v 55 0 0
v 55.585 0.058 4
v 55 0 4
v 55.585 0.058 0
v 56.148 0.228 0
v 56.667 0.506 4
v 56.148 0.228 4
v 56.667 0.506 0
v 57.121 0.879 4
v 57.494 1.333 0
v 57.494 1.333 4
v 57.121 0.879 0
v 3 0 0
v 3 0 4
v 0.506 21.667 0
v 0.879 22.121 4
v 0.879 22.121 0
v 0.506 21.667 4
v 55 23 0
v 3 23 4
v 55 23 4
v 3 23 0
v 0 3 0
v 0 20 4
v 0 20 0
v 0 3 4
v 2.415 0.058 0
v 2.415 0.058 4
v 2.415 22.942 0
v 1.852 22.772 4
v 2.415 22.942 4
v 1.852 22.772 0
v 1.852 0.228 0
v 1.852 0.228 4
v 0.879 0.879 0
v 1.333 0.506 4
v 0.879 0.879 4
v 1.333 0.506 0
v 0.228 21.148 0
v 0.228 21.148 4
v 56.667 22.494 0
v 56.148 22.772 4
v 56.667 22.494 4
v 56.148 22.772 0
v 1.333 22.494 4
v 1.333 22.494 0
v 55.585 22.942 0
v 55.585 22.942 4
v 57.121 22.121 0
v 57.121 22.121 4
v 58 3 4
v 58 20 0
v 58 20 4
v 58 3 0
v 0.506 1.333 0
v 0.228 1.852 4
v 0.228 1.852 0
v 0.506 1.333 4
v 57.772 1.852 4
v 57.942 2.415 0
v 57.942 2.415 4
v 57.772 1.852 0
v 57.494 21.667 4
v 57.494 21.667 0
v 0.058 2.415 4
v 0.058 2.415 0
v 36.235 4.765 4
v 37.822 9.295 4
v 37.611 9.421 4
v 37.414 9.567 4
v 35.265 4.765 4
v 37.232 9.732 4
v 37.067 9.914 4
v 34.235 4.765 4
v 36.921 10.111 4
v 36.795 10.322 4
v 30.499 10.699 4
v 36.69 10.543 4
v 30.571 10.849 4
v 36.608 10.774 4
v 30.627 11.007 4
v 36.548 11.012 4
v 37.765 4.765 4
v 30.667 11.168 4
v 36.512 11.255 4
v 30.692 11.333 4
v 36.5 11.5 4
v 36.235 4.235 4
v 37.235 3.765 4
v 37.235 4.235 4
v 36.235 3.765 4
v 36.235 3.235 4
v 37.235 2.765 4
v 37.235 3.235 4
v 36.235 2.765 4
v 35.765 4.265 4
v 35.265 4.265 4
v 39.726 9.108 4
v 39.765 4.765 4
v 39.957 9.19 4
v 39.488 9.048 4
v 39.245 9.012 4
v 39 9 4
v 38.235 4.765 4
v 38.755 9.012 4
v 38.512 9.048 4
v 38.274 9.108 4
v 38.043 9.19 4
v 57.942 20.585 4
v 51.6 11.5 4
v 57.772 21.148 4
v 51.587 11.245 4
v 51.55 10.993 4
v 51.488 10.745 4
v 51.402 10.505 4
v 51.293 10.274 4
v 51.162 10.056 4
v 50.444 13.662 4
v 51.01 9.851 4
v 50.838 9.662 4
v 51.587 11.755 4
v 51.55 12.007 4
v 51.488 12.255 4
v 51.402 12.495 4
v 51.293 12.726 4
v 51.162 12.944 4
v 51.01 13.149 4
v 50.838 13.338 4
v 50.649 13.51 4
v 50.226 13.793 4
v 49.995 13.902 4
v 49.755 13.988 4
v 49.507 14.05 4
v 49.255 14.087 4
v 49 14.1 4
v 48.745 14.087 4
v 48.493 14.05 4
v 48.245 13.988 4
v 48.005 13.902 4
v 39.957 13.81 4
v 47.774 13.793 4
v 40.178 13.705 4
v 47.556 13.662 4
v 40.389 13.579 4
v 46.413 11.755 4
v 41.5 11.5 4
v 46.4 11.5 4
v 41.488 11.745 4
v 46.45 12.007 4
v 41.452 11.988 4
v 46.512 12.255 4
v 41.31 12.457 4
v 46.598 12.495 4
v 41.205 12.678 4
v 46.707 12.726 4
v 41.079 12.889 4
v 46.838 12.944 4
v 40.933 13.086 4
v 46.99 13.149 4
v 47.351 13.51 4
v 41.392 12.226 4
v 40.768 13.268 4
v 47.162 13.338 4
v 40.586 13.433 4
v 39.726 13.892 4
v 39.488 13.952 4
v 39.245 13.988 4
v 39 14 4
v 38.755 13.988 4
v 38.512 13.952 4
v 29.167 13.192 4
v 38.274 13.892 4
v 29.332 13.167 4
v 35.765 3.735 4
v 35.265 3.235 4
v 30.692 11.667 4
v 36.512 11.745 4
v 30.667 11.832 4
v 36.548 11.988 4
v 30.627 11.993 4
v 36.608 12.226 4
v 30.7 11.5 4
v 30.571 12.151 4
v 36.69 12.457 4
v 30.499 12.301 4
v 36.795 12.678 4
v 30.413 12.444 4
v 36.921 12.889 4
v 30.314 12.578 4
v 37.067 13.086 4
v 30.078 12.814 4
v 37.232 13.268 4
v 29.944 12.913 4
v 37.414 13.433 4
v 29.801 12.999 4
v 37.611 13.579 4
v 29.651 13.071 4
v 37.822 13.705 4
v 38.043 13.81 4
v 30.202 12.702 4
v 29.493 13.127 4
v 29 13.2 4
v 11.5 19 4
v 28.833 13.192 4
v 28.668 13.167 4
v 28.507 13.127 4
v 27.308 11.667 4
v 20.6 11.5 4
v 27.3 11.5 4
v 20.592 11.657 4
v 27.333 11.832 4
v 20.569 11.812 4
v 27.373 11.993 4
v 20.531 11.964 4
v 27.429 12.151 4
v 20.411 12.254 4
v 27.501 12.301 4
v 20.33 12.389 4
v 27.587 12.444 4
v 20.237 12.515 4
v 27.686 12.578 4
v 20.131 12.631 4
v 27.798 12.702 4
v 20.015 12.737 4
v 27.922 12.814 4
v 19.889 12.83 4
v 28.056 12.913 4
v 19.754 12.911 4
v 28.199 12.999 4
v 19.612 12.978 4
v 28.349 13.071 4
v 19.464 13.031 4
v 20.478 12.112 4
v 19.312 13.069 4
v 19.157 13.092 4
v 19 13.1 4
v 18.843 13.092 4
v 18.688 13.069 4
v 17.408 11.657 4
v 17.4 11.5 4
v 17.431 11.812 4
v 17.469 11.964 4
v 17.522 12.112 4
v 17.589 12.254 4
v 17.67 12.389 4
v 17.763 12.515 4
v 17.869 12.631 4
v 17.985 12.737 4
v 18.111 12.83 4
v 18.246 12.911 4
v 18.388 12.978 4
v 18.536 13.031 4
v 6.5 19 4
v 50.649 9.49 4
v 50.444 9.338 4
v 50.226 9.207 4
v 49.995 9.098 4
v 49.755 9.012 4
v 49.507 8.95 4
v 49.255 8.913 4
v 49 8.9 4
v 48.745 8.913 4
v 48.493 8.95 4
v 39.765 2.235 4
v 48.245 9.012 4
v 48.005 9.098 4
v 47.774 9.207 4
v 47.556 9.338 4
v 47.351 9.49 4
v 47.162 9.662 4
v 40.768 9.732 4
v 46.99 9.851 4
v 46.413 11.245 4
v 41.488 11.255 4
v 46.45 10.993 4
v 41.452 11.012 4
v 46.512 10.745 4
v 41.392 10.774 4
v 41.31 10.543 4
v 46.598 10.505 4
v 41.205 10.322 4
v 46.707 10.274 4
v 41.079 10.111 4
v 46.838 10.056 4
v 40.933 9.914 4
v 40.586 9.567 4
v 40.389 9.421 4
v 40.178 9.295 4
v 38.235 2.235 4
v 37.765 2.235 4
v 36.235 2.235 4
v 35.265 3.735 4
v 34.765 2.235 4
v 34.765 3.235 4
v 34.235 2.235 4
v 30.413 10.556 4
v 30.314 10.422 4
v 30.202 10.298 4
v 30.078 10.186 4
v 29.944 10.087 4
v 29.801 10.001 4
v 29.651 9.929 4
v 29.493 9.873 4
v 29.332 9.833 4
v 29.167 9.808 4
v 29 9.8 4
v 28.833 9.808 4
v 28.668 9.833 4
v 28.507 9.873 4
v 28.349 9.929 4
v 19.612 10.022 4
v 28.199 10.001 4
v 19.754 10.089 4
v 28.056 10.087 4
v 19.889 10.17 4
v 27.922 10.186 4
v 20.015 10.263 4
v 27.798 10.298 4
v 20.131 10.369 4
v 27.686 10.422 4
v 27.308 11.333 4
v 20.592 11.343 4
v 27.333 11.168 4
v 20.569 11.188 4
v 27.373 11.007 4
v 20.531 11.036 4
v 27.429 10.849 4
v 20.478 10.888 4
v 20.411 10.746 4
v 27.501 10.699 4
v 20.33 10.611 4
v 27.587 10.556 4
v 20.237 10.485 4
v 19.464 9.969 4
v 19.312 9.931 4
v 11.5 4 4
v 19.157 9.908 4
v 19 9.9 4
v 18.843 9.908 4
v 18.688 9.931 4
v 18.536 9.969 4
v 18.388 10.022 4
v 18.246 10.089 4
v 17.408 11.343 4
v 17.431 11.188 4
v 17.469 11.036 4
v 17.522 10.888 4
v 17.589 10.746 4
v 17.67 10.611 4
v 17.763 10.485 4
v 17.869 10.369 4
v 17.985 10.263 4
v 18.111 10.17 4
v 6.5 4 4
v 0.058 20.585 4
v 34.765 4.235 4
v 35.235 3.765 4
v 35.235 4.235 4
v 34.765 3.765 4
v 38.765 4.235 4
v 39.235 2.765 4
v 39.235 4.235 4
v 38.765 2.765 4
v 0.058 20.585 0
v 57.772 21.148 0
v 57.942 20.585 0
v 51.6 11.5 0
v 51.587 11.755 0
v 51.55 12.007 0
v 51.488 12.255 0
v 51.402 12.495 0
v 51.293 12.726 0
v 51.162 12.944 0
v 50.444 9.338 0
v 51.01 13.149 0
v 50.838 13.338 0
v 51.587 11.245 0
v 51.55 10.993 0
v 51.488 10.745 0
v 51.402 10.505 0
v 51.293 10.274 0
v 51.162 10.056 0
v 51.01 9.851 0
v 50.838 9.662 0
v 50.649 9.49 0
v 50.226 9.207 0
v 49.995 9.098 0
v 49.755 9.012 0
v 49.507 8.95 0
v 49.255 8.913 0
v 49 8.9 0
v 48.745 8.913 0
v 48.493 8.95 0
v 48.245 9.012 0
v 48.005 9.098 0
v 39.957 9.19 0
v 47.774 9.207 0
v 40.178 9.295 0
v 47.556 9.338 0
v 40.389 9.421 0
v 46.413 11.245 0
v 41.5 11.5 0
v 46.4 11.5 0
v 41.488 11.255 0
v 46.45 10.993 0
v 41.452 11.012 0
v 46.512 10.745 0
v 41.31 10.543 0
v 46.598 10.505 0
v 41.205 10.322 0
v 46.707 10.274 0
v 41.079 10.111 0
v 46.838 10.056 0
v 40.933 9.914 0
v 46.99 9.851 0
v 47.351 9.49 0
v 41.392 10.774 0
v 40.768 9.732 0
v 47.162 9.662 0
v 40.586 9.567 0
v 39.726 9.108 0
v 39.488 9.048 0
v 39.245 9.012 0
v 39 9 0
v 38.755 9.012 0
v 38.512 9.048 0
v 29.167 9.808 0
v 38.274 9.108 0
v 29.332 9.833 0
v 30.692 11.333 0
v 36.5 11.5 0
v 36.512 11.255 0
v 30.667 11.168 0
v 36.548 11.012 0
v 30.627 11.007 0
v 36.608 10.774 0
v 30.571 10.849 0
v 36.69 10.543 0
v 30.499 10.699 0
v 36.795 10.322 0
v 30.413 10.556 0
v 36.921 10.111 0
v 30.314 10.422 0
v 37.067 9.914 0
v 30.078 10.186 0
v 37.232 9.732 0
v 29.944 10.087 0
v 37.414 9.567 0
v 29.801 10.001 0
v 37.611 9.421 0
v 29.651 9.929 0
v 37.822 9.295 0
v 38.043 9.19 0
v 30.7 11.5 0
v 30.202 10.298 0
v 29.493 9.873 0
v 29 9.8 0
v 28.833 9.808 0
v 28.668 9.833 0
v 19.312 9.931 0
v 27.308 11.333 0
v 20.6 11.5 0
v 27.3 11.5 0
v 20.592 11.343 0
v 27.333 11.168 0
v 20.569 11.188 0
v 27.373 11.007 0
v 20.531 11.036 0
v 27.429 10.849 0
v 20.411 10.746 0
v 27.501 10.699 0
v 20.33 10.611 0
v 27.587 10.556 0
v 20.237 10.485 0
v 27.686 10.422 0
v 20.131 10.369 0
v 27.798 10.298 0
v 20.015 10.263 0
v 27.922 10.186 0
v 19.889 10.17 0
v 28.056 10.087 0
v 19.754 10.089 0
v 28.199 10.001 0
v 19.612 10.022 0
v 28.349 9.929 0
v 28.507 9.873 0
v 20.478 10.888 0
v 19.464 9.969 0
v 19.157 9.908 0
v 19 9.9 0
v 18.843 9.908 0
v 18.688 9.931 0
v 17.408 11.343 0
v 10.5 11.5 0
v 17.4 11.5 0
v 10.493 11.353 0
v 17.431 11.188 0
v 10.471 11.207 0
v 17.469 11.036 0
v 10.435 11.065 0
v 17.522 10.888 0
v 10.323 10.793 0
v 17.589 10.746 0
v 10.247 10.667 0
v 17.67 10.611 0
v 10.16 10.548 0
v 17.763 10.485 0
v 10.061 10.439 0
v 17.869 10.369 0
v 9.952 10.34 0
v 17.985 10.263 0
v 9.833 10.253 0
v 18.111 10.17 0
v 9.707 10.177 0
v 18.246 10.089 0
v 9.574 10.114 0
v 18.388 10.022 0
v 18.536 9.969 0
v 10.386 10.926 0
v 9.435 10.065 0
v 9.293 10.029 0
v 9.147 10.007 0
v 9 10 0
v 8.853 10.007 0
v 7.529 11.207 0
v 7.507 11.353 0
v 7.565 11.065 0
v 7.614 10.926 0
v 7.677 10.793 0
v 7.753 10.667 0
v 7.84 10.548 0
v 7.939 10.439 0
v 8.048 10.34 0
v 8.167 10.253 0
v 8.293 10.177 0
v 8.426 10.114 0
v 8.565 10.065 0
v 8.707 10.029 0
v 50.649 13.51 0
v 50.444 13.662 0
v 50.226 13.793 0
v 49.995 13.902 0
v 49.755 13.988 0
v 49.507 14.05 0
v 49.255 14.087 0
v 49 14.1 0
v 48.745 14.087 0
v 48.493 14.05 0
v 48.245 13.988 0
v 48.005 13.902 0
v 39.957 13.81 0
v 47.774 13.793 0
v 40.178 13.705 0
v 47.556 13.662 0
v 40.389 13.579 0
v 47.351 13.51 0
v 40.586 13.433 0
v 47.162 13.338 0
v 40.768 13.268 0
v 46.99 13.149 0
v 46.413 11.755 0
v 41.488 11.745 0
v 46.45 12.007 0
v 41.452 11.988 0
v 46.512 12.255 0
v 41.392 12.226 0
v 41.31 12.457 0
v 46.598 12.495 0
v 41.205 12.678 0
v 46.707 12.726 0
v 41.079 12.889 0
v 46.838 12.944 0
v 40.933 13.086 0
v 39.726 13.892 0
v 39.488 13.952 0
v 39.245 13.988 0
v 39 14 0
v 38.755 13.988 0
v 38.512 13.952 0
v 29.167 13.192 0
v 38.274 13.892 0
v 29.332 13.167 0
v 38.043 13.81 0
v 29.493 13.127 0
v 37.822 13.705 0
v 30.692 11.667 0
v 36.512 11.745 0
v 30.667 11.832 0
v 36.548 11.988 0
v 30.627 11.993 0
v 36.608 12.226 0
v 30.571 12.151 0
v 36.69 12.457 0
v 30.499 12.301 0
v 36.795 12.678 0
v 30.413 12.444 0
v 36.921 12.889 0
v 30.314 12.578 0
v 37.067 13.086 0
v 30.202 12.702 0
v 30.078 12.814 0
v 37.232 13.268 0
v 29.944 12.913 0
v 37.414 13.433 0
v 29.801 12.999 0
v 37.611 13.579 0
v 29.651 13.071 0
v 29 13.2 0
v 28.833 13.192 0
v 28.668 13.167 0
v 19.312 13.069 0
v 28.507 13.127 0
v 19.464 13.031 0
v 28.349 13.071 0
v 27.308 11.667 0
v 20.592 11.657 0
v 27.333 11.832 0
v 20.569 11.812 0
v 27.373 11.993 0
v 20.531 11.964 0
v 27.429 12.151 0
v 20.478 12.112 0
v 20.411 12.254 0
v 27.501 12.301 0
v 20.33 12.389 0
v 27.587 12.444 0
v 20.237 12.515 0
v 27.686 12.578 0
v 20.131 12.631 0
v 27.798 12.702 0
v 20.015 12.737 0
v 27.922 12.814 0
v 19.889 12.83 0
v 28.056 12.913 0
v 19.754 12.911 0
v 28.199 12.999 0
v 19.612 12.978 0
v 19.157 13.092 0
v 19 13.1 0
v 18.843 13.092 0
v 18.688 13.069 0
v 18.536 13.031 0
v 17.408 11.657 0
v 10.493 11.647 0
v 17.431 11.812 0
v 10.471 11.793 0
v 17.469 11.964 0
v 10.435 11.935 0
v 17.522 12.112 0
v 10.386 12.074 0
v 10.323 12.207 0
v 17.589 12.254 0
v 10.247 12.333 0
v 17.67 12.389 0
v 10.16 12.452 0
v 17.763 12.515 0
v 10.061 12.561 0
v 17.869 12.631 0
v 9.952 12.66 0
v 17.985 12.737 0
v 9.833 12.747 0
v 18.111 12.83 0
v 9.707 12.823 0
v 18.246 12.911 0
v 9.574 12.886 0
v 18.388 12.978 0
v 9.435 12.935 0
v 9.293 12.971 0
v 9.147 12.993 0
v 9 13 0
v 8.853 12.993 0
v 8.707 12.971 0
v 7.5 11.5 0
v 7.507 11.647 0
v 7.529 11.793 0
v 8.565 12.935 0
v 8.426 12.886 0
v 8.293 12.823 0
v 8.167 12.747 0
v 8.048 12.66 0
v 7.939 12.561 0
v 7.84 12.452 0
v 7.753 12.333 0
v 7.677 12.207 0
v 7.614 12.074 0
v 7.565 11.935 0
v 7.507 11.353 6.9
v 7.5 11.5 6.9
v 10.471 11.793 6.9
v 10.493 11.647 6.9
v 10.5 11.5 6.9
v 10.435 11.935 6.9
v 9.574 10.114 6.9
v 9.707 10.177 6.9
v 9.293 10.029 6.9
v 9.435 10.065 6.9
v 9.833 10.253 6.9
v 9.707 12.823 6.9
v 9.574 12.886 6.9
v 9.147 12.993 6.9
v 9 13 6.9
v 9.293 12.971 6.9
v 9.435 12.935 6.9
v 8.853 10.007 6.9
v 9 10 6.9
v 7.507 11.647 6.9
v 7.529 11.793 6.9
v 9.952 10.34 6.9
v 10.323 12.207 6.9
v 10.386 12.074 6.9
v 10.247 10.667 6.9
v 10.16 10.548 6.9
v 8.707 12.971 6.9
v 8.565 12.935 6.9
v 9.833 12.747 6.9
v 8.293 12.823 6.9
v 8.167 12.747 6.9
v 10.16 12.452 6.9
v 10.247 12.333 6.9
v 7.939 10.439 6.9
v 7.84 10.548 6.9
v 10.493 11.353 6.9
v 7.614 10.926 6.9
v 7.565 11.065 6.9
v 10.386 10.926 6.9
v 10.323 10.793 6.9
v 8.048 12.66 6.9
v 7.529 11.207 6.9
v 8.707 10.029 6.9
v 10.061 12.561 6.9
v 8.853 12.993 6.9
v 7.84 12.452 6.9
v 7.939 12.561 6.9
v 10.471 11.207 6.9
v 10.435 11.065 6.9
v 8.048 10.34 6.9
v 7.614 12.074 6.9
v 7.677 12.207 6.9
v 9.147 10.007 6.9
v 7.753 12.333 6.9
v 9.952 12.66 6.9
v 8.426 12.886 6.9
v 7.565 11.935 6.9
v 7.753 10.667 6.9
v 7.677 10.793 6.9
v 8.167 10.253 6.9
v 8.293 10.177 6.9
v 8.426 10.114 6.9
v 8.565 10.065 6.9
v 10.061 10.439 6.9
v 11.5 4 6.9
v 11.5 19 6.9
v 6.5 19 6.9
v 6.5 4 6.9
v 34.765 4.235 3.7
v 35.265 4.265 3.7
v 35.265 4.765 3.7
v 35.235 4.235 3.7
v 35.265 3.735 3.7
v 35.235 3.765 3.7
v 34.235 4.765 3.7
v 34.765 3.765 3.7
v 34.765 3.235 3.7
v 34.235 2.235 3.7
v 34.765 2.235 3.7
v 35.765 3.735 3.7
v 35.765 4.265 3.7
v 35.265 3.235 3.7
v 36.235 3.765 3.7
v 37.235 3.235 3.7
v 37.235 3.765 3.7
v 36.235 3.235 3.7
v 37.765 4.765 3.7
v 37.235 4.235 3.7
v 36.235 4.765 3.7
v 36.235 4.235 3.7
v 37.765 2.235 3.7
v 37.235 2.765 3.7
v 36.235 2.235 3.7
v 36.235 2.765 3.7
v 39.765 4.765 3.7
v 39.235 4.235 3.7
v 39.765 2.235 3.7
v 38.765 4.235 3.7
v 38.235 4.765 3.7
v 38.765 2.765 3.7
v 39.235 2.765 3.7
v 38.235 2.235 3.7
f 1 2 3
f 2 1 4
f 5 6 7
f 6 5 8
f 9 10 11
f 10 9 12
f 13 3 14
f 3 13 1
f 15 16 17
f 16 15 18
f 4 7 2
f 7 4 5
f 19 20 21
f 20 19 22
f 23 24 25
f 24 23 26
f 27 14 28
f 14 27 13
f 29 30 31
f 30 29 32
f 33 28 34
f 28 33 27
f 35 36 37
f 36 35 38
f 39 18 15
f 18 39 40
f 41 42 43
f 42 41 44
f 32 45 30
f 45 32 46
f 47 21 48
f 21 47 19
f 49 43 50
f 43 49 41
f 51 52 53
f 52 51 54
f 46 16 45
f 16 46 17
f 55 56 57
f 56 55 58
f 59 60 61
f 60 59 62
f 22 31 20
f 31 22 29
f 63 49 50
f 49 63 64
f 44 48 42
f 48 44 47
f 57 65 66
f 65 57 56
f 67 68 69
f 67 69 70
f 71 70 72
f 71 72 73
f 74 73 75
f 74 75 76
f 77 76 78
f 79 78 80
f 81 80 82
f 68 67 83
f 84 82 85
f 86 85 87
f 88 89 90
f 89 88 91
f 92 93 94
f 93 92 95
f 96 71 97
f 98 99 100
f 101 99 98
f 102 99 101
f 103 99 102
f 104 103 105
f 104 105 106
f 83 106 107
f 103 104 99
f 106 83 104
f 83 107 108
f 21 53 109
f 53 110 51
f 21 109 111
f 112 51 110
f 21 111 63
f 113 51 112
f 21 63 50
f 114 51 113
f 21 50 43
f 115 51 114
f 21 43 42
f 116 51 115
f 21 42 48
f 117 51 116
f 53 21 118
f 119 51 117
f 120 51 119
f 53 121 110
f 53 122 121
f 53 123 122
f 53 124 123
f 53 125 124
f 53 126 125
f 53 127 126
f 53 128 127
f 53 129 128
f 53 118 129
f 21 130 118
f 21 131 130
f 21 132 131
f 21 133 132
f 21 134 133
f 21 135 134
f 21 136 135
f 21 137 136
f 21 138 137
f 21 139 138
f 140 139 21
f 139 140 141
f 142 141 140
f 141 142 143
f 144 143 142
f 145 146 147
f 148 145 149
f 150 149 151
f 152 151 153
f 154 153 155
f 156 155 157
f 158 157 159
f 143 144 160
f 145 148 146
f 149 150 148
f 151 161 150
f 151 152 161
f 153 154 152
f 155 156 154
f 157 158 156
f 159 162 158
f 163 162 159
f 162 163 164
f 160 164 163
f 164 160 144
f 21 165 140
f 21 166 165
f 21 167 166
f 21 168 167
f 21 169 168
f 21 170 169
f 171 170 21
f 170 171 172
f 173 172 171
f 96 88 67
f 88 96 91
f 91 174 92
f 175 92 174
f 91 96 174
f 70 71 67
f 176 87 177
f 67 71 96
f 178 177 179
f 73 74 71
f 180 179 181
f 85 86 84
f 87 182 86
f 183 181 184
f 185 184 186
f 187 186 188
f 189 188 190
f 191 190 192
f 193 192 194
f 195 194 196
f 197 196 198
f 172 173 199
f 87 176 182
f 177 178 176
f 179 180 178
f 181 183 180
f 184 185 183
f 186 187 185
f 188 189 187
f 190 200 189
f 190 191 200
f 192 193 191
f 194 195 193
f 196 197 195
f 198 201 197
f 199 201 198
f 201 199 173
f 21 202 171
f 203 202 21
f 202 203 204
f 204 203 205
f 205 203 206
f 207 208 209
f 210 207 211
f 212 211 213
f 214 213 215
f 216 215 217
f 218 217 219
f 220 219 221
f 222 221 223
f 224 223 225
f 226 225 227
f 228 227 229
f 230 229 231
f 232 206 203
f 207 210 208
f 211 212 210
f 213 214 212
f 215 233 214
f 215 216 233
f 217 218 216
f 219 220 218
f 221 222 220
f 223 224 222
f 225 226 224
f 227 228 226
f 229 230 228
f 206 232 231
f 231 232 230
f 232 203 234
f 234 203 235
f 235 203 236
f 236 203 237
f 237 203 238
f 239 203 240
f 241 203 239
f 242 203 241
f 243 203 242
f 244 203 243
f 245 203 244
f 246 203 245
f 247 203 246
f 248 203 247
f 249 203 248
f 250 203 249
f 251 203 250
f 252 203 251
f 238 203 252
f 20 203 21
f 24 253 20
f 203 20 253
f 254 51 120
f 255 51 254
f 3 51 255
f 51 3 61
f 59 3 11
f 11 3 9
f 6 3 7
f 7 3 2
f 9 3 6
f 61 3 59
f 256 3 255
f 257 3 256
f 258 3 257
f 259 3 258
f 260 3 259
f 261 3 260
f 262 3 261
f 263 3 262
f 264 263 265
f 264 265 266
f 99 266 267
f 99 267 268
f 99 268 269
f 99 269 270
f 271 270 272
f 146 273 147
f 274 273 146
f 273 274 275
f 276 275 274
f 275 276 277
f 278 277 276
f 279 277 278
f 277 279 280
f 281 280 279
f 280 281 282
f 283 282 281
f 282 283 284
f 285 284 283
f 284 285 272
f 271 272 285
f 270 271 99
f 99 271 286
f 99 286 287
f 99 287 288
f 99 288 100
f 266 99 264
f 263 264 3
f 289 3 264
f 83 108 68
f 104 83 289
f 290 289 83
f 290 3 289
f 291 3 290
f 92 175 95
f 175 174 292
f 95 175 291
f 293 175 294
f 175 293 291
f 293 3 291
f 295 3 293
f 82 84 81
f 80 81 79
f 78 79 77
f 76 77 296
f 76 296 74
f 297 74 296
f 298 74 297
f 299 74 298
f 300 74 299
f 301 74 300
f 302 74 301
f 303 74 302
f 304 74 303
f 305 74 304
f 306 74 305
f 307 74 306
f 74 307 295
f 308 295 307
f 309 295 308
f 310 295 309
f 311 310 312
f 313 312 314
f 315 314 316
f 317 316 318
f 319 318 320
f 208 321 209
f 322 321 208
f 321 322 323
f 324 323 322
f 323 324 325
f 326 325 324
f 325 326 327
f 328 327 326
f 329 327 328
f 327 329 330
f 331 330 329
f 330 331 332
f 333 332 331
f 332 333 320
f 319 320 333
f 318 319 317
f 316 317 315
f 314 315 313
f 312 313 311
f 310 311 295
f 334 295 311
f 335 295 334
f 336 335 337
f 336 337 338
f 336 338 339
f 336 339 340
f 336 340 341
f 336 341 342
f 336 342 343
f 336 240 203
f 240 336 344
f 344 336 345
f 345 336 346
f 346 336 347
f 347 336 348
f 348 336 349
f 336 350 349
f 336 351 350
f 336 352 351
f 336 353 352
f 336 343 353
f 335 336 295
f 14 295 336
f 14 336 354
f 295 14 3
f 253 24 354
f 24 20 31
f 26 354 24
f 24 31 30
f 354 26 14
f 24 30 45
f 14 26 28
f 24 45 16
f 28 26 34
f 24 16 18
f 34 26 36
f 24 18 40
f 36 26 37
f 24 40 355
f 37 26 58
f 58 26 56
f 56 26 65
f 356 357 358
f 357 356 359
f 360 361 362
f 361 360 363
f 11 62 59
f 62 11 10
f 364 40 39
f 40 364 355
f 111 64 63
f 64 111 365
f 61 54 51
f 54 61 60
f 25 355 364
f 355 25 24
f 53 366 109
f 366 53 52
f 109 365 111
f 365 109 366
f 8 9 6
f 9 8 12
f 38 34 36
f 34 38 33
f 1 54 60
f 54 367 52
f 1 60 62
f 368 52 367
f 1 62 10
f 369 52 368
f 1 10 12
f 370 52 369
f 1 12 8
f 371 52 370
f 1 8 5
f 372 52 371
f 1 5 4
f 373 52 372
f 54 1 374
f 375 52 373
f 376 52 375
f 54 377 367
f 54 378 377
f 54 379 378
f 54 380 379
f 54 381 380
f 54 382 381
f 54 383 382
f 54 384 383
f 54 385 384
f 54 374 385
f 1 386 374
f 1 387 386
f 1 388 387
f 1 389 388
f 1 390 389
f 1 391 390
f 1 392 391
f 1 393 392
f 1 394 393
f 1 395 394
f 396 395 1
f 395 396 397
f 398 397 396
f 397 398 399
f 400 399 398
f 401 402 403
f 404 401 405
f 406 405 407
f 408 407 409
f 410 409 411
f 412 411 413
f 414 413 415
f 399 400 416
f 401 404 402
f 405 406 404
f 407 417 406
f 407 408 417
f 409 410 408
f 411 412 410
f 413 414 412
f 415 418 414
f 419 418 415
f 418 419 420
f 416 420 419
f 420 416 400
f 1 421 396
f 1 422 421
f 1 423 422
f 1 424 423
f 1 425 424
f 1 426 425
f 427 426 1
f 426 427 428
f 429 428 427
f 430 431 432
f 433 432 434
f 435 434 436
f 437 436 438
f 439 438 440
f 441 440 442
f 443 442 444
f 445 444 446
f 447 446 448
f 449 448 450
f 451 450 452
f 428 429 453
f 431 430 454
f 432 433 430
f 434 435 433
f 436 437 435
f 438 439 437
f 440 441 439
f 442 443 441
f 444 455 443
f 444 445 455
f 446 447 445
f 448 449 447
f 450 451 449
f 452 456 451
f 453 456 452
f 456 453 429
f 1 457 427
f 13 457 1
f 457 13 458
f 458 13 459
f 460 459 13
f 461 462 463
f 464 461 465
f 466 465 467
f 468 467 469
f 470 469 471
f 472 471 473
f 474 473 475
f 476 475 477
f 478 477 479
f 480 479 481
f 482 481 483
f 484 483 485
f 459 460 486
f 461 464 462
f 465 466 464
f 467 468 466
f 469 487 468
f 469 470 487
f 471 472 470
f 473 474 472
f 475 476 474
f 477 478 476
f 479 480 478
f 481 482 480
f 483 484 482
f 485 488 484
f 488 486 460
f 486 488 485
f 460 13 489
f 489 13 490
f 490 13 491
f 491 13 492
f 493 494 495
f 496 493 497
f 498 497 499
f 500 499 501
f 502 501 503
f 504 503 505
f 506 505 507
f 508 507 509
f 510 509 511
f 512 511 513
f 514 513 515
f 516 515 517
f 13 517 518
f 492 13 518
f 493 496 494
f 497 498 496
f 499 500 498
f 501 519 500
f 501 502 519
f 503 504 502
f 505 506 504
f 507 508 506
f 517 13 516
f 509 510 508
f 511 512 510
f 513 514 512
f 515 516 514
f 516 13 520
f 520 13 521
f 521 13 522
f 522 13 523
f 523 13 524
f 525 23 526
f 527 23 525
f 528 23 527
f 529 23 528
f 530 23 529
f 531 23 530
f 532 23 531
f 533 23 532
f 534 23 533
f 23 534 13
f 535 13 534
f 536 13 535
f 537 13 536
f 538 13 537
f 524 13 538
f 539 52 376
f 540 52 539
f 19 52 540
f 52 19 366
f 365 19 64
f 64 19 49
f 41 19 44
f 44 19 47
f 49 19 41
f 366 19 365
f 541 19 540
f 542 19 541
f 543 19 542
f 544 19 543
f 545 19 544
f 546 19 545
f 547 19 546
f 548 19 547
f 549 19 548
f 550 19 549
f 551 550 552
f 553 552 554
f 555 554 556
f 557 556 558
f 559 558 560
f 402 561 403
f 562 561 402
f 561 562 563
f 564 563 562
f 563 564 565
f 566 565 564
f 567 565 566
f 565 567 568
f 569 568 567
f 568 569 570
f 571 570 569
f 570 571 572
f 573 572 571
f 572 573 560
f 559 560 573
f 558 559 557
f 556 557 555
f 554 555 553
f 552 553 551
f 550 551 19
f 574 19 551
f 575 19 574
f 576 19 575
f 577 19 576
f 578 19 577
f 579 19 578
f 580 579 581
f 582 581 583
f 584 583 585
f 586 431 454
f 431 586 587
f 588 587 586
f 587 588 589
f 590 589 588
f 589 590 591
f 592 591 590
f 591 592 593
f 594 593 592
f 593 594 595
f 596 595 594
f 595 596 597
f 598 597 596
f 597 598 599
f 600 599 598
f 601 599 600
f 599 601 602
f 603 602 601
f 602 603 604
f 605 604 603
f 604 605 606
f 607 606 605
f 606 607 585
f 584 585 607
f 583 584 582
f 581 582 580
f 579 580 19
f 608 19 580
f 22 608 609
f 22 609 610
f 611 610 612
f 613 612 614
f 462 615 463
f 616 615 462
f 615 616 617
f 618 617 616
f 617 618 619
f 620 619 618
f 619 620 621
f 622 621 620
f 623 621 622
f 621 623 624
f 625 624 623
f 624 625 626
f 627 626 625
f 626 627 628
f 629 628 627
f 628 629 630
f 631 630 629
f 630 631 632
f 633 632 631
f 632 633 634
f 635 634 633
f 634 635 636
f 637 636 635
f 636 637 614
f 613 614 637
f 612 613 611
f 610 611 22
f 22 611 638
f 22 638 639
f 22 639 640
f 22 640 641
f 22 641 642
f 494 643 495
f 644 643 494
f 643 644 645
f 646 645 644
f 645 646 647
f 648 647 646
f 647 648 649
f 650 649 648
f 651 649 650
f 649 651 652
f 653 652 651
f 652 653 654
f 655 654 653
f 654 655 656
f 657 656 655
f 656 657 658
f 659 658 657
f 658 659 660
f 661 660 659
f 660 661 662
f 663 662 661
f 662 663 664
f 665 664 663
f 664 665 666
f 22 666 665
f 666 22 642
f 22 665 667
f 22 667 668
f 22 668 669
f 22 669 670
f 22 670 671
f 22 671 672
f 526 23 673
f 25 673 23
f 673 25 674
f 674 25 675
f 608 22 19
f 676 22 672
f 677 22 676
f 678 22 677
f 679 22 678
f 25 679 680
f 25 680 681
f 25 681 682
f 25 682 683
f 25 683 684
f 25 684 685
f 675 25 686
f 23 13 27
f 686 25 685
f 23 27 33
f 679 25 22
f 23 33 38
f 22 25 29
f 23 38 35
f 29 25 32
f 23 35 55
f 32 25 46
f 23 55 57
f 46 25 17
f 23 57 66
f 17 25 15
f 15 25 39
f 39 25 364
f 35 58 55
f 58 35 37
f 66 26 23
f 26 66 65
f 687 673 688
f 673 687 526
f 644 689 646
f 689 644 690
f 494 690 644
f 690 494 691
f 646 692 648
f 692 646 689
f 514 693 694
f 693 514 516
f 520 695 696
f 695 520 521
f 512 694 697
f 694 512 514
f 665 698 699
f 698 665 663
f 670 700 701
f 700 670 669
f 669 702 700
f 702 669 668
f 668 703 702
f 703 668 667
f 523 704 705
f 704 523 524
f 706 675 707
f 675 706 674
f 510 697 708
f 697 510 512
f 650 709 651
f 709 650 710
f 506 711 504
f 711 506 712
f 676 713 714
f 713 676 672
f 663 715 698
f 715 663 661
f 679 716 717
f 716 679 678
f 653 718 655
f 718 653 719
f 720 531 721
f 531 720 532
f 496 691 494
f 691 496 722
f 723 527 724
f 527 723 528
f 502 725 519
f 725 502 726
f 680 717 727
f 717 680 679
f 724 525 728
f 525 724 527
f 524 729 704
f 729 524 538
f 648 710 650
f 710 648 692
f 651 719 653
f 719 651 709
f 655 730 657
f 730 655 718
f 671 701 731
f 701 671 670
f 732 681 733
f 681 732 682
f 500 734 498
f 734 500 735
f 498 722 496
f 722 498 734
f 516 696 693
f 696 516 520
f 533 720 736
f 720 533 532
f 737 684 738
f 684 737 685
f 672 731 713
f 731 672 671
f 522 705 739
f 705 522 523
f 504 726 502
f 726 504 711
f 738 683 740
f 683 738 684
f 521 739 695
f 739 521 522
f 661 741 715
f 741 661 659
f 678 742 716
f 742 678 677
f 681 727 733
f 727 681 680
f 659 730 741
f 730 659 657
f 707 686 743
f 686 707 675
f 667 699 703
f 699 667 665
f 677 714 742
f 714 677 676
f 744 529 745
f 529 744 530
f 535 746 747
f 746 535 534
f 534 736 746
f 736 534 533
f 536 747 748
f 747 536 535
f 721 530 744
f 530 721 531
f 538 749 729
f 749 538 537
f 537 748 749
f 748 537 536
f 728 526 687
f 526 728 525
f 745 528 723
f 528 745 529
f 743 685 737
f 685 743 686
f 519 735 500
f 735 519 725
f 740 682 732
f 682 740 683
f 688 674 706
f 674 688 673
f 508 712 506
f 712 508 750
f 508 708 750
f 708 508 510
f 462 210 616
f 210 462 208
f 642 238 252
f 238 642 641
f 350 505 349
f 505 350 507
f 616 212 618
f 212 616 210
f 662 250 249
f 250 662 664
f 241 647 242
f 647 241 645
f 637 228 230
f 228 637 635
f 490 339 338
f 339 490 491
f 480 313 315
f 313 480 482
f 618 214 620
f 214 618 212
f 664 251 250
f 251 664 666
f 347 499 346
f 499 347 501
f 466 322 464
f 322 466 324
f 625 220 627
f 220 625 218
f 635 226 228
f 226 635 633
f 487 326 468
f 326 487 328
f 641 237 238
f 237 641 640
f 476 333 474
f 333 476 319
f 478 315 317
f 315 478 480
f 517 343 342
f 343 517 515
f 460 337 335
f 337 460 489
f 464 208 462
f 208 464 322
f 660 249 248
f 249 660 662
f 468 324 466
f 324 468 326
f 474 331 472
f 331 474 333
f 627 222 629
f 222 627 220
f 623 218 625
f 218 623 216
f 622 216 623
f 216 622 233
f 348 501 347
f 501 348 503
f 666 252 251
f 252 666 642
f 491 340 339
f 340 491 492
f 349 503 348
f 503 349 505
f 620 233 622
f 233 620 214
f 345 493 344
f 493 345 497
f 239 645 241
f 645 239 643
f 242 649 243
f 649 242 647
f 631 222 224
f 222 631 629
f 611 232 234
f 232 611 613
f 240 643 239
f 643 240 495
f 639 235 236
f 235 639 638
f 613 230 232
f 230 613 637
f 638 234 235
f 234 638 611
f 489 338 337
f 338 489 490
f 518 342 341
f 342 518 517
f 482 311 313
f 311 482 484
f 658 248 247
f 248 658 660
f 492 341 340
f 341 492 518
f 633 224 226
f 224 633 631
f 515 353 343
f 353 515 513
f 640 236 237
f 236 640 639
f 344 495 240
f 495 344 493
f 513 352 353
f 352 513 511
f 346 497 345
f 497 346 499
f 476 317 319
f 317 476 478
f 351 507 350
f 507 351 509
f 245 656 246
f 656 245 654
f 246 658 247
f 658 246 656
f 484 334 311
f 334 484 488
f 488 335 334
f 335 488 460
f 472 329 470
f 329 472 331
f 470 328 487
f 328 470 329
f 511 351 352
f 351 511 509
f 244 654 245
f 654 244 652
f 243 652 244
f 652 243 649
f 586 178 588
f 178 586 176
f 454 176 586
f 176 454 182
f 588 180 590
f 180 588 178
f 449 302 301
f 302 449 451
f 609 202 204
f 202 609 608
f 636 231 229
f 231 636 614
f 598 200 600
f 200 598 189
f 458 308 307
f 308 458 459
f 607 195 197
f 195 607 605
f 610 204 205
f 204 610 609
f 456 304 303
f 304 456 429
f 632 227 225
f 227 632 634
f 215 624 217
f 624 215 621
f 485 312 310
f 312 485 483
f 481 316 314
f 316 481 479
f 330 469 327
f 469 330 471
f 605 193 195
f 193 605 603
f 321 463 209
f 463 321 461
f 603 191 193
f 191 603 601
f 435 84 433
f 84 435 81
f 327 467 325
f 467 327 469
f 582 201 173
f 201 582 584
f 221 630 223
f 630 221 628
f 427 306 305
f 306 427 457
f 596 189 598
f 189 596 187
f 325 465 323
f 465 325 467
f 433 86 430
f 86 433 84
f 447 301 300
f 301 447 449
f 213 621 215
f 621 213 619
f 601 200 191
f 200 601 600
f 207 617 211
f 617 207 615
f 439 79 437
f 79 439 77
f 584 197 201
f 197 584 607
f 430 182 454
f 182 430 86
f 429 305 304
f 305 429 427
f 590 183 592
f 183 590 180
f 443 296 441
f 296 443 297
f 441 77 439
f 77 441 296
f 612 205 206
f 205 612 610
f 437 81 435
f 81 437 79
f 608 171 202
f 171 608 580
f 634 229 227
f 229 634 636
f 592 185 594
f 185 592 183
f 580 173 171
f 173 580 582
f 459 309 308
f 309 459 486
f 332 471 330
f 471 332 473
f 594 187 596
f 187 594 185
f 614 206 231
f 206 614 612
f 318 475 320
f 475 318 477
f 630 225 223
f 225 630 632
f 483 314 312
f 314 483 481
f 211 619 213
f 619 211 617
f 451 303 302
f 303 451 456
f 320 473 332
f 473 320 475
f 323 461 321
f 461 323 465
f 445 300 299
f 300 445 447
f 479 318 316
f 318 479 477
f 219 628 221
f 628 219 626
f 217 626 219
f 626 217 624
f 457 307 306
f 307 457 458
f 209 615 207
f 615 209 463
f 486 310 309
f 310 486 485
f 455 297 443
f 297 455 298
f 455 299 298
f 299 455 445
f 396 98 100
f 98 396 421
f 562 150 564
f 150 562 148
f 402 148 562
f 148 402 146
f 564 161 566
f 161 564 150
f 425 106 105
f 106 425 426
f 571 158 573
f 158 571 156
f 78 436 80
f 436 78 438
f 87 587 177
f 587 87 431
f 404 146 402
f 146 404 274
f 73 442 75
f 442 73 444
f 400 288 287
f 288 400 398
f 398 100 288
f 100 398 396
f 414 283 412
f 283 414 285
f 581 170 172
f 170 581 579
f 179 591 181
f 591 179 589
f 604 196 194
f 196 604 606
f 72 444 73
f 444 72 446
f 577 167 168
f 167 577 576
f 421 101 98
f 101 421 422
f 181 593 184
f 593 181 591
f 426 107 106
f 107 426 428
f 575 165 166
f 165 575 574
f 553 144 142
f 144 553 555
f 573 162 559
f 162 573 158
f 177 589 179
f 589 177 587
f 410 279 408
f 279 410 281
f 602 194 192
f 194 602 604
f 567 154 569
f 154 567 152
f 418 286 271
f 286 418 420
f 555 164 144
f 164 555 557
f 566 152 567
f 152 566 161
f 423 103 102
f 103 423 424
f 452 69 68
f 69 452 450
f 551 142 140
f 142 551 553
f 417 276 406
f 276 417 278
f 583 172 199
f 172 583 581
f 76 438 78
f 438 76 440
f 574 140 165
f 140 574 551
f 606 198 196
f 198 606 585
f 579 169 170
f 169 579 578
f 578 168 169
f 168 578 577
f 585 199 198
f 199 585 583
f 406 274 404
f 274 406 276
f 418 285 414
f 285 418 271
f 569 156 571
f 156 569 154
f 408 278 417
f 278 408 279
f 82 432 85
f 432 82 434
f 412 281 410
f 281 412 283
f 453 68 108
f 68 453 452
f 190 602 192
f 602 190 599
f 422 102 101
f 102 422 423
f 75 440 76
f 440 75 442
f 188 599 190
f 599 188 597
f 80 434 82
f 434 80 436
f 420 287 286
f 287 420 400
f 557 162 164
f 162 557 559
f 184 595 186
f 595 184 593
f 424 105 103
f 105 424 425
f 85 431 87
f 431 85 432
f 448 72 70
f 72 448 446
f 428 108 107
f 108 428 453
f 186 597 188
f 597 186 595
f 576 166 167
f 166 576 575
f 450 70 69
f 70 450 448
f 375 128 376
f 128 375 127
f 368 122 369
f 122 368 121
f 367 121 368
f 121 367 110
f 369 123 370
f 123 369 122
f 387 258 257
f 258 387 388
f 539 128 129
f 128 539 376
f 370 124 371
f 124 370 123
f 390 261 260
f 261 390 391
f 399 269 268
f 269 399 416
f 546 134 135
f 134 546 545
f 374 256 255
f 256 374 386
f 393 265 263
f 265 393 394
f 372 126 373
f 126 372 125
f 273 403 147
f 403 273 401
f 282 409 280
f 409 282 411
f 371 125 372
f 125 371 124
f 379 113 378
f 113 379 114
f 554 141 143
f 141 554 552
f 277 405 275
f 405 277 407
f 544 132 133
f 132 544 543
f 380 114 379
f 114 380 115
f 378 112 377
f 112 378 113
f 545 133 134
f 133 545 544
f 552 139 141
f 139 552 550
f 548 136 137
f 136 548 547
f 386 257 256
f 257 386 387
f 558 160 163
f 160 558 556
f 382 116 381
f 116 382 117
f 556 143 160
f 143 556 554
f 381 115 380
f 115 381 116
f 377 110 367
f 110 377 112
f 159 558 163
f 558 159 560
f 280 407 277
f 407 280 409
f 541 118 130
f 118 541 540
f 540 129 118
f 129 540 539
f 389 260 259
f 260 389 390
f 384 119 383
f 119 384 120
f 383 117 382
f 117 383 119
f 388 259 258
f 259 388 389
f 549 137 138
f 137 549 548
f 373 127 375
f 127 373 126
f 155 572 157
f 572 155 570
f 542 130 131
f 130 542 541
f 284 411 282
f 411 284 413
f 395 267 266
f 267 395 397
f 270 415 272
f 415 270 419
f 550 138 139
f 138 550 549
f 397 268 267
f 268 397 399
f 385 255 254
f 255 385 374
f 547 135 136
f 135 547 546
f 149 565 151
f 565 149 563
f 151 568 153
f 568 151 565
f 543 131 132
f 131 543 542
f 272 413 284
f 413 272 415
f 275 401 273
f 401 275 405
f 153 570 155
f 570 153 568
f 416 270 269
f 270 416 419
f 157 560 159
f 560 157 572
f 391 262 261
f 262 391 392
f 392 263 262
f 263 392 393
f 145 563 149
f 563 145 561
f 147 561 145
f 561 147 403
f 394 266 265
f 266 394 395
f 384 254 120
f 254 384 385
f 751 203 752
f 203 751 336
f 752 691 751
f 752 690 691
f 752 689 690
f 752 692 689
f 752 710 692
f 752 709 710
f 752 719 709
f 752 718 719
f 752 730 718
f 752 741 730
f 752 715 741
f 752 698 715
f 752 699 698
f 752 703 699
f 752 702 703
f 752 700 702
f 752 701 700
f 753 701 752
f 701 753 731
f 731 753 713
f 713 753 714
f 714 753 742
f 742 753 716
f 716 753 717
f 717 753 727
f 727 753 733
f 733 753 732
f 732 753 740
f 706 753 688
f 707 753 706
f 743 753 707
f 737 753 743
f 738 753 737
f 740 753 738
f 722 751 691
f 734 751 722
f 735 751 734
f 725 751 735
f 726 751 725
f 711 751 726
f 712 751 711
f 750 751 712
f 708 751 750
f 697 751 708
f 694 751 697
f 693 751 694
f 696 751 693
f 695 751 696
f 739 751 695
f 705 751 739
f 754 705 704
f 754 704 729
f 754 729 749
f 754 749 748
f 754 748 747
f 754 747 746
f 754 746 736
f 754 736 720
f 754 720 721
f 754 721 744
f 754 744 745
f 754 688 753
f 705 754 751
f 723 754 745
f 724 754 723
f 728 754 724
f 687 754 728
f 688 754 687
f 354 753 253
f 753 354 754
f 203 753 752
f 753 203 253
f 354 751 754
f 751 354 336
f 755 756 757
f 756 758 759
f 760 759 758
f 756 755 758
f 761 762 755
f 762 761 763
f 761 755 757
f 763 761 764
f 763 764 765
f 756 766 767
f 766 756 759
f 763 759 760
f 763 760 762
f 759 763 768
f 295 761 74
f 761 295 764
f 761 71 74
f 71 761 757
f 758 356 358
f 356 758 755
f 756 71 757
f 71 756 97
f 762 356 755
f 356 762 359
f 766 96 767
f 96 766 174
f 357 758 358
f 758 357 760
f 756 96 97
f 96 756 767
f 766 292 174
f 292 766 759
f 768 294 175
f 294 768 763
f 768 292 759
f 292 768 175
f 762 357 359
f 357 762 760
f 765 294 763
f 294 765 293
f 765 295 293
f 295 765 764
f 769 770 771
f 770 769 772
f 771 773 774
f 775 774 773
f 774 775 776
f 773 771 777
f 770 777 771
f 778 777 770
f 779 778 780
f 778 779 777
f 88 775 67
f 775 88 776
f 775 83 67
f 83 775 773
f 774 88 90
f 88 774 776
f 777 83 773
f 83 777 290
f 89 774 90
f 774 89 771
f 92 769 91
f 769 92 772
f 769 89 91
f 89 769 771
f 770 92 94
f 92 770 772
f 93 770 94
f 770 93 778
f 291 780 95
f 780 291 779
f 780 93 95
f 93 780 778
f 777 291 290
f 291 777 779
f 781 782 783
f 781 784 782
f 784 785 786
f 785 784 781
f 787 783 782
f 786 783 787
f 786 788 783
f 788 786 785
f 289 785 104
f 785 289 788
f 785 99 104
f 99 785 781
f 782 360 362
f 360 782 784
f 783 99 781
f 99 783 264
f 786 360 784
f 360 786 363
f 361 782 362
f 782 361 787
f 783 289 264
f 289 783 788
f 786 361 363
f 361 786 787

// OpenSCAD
// 孔徑試配片
$fn=64;
translate([29,11.5,-0]){rotate([0,0,0]){difference(){difference(){union(){difference(){difference(){difference(){difference(){difference(){translate([0,0,0]){translate([0,0,0]){linear_extrude(height=4)polygon([[29,8.5],[28.94236,9.08527],[28.77164,9.64805],[28.49441,10.16671],[28.12132,10.62132],[27.66671,10.99441],[27.14805,11.27164],[26.58527,11.44236],[26,11.5],[-26,11.5],[-26.58527,11.44236],[-27.14805,11.27164],[-27.66671,10.99441],[-28.12132,10.62132],[-28.49441,10.16671],[-28.77164,9.64805],[-28.94236,9.08527],[-29,8.5],[-29,-8.5],[-28.94236,-9.08527],[-28.77164,-9.64805],[-28.49441,-10.16671],[-28.12132,-10.62132],[-27.66671,-10.99441],[-27.14805,-11.27164],[-26.58527,-11.44236],[-26,-11.5],[26,-11.5],[26.58527,-11.44236],[27.14805,-11.27164],[27.66671,-10.99441],[28.12132,-10.62132],[28.49441,-10.16671],[28.77164,-9.64805],[28.94236,-9.08527],[29,-8.5]]);}}translate([-20,0,-1]){cylinder(h=7,d1=3,d2=3,$fn=64);}}translate([-10,0,-1]){cylinder(h=7,d1=3.2,d2=3.2,$fn=64);}}translate([0,0,-1]){cylinder(h=7,d1=3.4,d2=3.4,$fn=64);}}translate([10,0,-1]){cylinder(h=7,d1=5,d2=5,$fn=64);}}translate([20,0,-1]){cylinder(h=7,d1=5.2,d2=5.2,$fn=64);}}translate([-22.5,-7.5,3.9]){cube([5,15,3]);}}translate([-20,0,-1]){cylinder(h=9,d1=3,d2=3,$fn=64);}}multmatrix([[1,0,0,8],[0,1,0,-8],[0,0,1,4],[0,0,0,1]]){union(){union(){union(){union(){union(){union(){union(){union(){union(){union(){union(){union(){union(){union(){union(){union(){union(){union(){union(){union(){union(){union(){union(){union(){union(){union(){union(){union(){union(){union(){translate([-2.765,0.735,-0.3]){cube([0.53,0.53,0.42]);}translate([-2.265,0.735,-0.3]){cube([0.53,0.53,0.42]);}}translate([-2.765,0.235,-0.3]){cube([0.53,0.53,0.42]);}}translate([-1.765,0.235,-0.3]){cube([0.53,0.53,0.42]);}}translate([-2.765,-0.265,-0.3]){cube([0.53,0.53,0.42]);}}translate([-2.265,-0.265,-0.3]){cube([0.53,0.53,0.42]);}}translate([-2.765,-0.765,-0.3]){cube([0.53,0.53,0.42]);}}translate([-2.765,-1.265,-0.3]){cube([0.53,0.53,0.42]);}}translate([-0.765,0.735,-0.3]){cube([0.53,0.53,0.42]);}}translate([-0.265,0.735,-0.3]){cube([0.53,0.53,0.42]);}}translate([0.235,0.735,-0.3]){cube([0.53,0.53,0.42]);}}translate([0.235,0.235,-0.3]){cube([0.53,0.53,0.42]);}}translate([-0.765,-0.265,-0.3]){cube([0.53,0.53,0.42]);}}translate([-0.265,-0.265,-0.3]){cube([0.53,0.53,0.42]);}}translate([0.235,-0.265,-0.3]){cube([0.53,0.53,0.42]);}}translate([0.235,-0.765,-0.3]){cube([0.53,0.53,0.42]);}}translate([-0.765,-1.265,-0.3]){cube([0.53,0.53,0.42]);}}translate([-0.265,-1.265,-0.3]){cube([0.53,0.53,0.42]);}}translate([0.235,-1.265,-0.3]){cube([0.53,0.53,0.42]);}}translate([1.235,0.735,-0.3]){cube([0.53,0.53,0.42]);}}translate([1.735,0.735,-0.3]){cube([0.53,0.53,0.42]);}}translate([2.235,0.735,-0.3]){cube([0.53,0.53,0.42]);}}translate([1.235,0.235,-0.3]){cube([0.53,0.53,0.42]);}}translate([2.235,0.235,-0.3]){cube([0.53,0.53,0.42]);}}translate([1.235,-0.265,-0.3]){cube([0.53,0.53,0.42]);}}translate([2.235,-0.265,-0.3]){cube([0.53,0.53,0.42]);}}translate([1.235,-0.765,-0.3]){cube([0.53,0.53,0.42]);}}translate([2.235,-0.765,-0.3]){cube([0.53,0.53,0.42]);}}translate([1.235,-1.265,-0.3]){cube([0.53,0.53,0.42]);}}translate([1.735,-1.265,-0.3]){cube([0.53,0.53,0.42]);}}translate([2.235,-1.265,-0.3]){cube([0.53,0.53,0.42]);}}}}}}
